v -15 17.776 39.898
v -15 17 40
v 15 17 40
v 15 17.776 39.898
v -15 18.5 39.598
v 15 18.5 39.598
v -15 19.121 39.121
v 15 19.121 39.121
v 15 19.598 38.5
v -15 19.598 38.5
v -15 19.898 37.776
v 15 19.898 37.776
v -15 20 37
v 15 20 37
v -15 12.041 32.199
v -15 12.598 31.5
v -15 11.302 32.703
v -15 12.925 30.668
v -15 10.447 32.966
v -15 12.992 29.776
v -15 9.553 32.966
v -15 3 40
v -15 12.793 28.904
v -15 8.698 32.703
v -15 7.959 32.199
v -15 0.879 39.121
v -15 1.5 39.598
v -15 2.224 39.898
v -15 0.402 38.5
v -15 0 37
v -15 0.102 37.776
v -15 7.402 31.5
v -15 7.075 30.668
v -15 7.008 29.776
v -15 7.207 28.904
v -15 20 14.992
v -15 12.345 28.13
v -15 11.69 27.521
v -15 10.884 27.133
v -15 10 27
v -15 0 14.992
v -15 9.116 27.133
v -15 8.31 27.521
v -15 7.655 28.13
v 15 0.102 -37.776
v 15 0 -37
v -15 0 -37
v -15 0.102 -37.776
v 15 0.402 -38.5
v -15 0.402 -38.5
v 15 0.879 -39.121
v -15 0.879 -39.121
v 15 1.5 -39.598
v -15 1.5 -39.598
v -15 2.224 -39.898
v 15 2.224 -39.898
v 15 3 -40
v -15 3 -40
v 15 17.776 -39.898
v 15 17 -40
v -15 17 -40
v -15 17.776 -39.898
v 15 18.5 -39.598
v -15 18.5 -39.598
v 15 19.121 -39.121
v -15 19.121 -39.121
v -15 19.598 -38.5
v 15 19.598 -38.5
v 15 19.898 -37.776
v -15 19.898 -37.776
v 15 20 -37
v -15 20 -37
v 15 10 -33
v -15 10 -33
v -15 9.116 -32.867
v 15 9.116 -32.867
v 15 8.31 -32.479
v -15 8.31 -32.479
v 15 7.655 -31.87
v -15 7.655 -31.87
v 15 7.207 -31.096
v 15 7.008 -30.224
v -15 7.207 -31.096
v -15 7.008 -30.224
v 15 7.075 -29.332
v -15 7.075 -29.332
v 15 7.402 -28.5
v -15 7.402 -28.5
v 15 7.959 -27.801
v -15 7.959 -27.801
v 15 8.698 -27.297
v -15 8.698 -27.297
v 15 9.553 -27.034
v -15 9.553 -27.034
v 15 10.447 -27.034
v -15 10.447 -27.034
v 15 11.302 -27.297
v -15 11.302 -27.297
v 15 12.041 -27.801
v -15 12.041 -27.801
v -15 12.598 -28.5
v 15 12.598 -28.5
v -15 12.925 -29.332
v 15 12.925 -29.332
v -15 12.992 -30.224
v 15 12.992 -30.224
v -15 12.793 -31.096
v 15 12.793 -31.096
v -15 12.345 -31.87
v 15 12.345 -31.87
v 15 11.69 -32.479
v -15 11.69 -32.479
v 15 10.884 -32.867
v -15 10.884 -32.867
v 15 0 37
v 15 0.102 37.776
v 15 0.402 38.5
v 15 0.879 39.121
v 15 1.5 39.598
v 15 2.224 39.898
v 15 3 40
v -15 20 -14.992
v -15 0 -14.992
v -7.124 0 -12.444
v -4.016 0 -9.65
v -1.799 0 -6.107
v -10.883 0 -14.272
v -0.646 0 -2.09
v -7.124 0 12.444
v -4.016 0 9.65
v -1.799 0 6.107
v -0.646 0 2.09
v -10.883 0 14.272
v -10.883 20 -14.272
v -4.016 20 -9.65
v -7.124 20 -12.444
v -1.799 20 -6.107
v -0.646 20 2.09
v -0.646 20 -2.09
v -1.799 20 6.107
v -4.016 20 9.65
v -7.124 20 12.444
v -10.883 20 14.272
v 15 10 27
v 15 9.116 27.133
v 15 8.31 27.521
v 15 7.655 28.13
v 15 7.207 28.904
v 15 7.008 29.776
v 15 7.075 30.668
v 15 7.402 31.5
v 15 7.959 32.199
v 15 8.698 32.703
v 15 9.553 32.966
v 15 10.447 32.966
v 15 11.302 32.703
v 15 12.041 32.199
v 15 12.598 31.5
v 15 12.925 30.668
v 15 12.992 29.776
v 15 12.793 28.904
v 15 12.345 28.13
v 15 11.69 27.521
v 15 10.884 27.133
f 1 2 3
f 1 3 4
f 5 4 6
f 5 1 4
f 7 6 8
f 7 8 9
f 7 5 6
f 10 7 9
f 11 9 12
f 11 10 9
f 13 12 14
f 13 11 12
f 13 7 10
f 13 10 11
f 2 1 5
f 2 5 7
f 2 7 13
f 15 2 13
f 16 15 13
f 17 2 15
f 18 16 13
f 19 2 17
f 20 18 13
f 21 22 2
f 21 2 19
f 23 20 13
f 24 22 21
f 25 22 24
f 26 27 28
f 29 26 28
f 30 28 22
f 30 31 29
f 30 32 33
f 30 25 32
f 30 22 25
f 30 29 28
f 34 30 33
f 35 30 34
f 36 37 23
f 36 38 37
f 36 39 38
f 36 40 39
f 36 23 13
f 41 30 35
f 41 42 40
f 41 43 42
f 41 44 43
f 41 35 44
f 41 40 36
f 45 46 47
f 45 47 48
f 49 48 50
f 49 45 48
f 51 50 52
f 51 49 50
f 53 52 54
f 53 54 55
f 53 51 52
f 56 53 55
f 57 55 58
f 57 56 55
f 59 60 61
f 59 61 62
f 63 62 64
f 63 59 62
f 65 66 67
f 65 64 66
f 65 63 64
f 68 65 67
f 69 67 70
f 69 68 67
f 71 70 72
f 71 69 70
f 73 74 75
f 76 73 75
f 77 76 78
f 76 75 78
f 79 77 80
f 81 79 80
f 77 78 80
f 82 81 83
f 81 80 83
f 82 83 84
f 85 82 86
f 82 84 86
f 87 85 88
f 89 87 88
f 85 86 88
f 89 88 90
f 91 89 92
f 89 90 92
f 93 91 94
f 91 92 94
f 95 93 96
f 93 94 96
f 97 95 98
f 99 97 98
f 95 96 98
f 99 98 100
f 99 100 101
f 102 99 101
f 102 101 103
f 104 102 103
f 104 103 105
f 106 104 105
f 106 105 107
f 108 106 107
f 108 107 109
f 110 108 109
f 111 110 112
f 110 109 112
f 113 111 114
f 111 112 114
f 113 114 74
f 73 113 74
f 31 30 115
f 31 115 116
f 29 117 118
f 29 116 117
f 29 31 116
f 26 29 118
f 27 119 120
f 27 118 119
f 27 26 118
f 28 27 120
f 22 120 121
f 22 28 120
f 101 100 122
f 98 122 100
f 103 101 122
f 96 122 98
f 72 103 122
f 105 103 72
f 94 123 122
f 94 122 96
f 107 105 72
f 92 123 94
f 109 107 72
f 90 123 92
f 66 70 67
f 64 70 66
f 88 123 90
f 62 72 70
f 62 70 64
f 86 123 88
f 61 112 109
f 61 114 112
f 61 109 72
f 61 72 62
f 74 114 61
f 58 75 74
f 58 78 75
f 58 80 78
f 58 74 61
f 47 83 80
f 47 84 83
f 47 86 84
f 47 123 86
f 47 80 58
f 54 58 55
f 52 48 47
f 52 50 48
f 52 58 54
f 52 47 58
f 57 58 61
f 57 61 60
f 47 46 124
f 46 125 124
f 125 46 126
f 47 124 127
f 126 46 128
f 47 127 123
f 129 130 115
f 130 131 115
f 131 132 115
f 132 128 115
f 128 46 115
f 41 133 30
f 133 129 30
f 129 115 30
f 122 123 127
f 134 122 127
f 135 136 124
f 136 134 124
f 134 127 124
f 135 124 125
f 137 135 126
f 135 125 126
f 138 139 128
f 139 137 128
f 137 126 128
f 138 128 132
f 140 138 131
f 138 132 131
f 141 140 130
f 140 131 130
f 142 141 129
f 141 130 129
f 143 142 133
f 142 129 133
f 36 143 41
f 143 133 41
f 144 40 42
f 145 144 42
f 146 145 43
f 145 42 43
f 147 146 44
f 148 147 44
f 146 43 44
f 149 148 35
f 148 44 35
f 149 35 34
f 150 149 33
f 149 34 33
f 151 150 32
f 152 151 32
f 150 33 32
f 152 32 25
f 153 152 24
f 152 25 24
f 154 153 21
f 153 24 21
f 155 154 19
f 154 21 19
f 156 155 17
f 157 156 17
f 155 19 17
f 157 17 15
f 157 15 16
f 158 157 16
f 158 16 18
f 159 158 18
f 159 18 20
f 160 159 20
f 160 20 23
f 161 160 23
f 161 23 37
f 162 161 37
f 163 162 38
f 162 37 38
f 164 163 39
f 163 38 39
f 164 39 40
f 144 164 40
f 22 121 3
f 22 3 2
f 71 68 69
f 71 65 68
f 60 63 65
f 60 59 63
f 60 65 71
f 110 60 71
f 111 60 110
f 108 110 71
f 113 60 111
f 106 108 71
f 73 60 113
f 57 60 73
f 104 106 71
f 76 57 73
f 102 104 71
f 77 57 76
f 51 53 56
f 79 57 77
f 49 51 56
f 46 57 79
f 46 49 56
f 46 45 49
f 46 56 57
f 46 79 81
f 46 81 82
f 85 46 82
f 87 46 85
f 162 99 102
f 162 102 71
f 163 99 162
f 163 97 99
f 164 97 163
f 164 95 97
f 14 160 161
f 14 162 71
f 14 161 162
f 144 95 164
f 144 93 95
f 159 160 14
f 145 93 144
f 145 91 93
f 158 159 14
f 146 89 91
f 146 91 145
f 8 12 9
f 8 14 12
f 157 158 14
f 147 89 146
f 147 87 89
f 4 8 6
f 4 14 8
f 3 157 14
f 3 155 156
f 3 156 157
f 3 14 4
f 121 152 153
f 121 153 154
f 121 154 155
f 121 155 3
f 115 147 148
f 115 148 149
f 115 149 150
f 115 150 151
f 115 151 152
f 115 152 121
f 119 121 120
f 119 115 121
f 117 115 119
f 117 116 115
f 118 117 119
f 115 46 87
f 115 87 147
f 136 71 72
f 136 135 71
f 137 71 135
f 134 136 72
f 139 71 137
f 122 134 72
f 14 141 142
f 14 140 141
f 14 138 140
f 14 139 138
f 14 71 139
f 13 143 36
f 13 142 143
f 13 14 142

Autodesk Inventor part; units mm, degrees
ref_plane "YZ Plane" through (0, 0, 0) normal (1, 0, 0) x (0, 1, 0)
ref_plane "XZ Plane" through (0, 0, 0) normal (0, 1, 0) x (-1, 0, 0)
ref_plane "XY Plane" through (0, 0, 0) normal (0, 0, 1) x (1, 0, 0)
sketch "Sketch1" plane through (0, 0, 0) normal (0, 1, 0) x (-1, 0, 0)
  line L0 (-15, 40) -> (15, 40)
  line L1 (15, 40) -> (15, -40)
  line L2 (15, -40) -> (-15, -40)
  line L3 (-15, -40) -> (-15, 40)
  arc A0 (15, 14.9917) -> (15, -14.9917) centre (15.5, 0) ccw
  point P0 (0, 0)
  dimension "d0" = 80
  dimension "d1" = 30
  dimension "d2" = 40
  dimension "d3" = 15
  dimension "d4" = 30
  dimension "d22" = 0.5
extrude "Extrusion1" add sketch "Sketch1" along normal blind 20 contours L0 L1 A0 L2 L3
sketch "Sketch2" plane through (15, 0, 40) normal (1, 0, 0) x (0, 0, -1)
  line L0 (0, 0) -> (80, 0) projected
  line L1 (80, 0) -> (80, 20) projected
  line L2 (0, 20) -> (80, 20) projected
  line L3 (0, 0) -> (0, 20) projected
  point P0 (40, 0)
  point P1 (10, 10)
  point P2 (70, 10)
  dimension "d8" = 10
  dimension "d9" = 10
  dimension "d10" = 10
  dimension "d11" = 10
hole "Hole1" at (15, 10, 30) at (15, 10, -30) direction (-1, 0, 0) diameter 6 end through all
fillet "Fillet1" radius 3 4 edges at (0, 20, -40) (0, 20, 40) (0, 0, 40) (0, 0, -40)
equation "\"d2\" = 0.5 * d0"
equation "\"d3\" = 0.5 * d1"
equation "\"d9\" = d8"
properties part number "3DP_ASA_Balcony_Mounting_Clamp_Front"
